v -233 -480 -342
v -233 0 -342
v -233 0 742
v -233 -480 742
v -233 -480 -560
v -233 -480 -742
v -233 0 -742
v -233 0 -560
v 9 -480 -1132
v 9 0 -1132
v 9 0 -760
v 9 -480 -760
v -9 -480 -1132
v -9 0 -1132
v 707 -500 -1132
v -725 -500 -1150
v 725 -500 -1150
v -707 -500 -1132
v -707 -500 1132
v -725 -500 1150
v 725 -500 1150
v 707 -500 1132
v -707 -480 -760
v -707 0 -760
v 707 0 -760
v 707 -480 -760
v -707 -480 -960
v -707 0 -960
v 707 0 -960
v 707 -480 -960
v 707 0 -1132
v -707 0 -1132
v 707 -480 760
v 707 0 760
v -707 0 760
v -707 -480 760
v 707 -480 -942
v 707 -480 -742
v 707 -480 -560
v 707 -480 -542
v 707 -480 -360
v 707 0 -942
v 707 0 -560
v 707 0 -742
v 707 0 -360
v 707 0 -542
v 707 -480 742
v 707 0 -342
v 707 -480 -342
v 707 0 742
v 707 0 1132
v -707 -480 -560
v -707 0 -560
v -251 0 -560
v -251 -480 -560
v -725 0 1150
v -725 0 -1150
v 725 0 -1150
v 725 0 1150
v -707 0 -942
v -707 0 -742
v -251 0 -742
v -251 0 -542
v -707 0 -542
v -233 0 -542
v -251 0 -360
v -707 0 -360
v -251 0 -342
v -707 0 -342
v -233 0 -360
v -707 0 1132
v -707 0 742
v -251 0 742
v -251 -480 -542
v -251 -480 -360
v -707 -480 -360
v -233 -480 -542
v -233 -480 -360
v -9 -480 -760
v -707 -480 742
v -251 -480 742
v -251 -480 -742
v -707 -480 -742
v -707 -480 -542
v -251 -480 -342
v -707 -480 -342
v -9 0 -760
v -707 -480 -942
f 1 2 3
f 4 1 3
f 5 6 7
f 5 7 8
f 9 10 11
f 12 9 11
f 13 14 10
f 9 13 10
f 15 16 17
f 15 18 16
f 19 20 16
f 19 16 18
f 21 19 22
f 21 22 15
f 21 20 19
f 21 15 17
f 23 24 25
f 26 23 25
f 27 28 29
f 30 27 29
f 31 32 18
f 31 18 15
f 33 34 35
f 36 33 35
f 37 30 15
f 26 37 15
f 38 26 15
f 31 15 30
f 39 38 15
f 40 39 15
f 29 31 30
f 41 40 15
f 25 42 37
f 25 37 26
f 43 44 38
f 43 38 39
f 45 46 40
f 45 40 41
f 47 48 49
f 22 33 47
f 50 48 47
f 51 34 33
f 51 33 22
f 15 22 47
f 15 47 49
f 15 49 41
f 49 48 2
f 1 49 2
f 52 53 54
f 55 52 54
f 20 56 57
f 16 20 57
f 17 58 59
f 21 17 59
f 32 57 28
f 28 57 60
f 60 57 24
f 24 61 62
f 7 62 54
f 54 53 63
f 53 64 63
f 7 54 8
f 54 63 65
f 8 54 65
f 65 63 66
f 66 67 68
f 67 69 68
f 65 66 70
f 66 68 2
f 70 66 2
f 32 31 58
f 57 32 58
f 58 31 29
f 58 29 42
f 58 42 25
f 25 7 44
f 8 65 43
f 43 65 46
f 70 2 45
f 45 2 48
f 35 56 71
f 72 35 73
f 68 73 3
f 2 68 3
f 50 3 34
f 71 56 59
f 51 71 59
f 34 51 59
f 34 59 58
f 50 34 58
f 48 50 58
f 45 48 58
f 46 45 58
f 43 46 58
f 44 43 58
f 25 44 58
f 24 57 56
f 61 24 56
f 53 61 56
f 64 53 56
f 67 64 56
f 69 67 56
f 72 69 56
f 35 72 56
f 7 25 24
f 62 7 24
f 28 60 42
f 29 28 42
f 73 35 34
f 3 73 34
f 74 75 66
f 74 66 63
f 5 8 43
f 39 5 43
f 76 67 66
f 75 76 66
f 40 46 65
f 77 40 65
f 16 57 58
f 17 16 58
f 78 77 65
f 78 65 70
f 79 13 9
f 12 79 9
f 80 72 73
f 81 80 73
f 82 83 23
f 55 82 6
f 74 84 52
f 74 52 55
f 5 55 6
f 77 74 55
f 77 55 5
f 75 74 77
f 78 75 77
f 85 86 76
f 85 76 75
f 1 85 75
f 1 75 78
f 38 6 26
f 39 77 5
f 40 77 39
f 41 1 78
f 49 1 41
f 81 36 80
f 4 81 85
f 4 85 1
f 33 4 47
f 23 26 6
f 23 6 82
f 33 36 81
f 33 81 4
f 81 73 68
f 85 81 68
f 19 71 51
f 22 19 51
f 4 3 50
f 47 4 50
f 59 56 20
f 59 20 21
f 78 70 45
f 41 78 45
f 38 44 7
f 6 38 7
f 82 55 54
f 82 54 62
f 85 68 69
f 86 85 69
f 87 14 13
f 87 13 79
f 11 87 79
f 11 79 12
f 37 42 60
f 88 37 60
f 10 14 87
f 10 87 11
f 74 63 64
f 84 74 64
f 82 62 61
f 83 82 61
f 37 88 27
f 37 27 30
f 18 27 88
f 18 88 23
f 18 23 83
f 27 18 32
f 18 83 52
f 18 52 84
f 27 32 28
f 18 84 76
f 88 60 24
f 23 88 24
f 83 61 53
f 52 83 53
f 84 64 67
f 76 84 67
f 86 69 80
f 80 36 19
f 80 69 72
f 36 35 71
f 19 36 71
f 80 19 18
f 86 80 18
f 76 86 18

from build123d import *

# Parameters (mm, degrees)
F0_W     = 1450
F0_H     = 2300
F1_DEPTH = 500
F2_W     = 1414
F2_H     = 2264
F3_DEPTH = 500
F5_DEPTH = 480
F6_W     = 18
F6_H     = 372
F7_DEPTH = 480


with BuildPart() as f1:
    # F0 (on Front) → F1 (new body)
    with BuildSketch(Plane.XZ):
        Rectangle(F0_W, F0_H)
    extrude(amount=F1_DEPTH)

    # F2 (on face) → F3 (cut)
    with BuildSketch(Plane.XZ):
        Rectangle(F2_W, F2_H)
    extrude(amount=F3_DEPTH, mode=Mode.SUBTRACT)

    # F4 (on face) → F5 (join)
    with BuildSketch(Plane.XZ):
        Polygon((-725, -960), (725, -960), (725, -942), (-233, -942), (-251, -942), (-725, -942), align=None)
        Polygon((-233, -760), (725, -760), (725, -742), (-233, -742), (-233, -560), (725, -560), (725, -542), (-233, -542), (-233, -360), (725, -360), (725, -342), (-233, -342), (-233, 742), (725, 742), (725, 760), (-725, 760), (-725, 742), (-251, 742), (-251, -342), (-725, -342), (-725, -360), (-251, -360), (-251, -542), (-725, -542), (-725, -560), (-251, -560), (-251, -742), (-725, -742), (-725, -760), (-251, -760), align=None)
    extrude(amount=F5_DEPTH)


with BuildPart() as f7:
    # F6 (on face) → F7 (new body)
    with BuildSketch(Plane.XZ):
        with Locations((0, -946)):
            Rectangle(F6_W, F6_H)
    extrude(amount=F7_DEPTH)


solid = Compound([f1.part, f7.part])
